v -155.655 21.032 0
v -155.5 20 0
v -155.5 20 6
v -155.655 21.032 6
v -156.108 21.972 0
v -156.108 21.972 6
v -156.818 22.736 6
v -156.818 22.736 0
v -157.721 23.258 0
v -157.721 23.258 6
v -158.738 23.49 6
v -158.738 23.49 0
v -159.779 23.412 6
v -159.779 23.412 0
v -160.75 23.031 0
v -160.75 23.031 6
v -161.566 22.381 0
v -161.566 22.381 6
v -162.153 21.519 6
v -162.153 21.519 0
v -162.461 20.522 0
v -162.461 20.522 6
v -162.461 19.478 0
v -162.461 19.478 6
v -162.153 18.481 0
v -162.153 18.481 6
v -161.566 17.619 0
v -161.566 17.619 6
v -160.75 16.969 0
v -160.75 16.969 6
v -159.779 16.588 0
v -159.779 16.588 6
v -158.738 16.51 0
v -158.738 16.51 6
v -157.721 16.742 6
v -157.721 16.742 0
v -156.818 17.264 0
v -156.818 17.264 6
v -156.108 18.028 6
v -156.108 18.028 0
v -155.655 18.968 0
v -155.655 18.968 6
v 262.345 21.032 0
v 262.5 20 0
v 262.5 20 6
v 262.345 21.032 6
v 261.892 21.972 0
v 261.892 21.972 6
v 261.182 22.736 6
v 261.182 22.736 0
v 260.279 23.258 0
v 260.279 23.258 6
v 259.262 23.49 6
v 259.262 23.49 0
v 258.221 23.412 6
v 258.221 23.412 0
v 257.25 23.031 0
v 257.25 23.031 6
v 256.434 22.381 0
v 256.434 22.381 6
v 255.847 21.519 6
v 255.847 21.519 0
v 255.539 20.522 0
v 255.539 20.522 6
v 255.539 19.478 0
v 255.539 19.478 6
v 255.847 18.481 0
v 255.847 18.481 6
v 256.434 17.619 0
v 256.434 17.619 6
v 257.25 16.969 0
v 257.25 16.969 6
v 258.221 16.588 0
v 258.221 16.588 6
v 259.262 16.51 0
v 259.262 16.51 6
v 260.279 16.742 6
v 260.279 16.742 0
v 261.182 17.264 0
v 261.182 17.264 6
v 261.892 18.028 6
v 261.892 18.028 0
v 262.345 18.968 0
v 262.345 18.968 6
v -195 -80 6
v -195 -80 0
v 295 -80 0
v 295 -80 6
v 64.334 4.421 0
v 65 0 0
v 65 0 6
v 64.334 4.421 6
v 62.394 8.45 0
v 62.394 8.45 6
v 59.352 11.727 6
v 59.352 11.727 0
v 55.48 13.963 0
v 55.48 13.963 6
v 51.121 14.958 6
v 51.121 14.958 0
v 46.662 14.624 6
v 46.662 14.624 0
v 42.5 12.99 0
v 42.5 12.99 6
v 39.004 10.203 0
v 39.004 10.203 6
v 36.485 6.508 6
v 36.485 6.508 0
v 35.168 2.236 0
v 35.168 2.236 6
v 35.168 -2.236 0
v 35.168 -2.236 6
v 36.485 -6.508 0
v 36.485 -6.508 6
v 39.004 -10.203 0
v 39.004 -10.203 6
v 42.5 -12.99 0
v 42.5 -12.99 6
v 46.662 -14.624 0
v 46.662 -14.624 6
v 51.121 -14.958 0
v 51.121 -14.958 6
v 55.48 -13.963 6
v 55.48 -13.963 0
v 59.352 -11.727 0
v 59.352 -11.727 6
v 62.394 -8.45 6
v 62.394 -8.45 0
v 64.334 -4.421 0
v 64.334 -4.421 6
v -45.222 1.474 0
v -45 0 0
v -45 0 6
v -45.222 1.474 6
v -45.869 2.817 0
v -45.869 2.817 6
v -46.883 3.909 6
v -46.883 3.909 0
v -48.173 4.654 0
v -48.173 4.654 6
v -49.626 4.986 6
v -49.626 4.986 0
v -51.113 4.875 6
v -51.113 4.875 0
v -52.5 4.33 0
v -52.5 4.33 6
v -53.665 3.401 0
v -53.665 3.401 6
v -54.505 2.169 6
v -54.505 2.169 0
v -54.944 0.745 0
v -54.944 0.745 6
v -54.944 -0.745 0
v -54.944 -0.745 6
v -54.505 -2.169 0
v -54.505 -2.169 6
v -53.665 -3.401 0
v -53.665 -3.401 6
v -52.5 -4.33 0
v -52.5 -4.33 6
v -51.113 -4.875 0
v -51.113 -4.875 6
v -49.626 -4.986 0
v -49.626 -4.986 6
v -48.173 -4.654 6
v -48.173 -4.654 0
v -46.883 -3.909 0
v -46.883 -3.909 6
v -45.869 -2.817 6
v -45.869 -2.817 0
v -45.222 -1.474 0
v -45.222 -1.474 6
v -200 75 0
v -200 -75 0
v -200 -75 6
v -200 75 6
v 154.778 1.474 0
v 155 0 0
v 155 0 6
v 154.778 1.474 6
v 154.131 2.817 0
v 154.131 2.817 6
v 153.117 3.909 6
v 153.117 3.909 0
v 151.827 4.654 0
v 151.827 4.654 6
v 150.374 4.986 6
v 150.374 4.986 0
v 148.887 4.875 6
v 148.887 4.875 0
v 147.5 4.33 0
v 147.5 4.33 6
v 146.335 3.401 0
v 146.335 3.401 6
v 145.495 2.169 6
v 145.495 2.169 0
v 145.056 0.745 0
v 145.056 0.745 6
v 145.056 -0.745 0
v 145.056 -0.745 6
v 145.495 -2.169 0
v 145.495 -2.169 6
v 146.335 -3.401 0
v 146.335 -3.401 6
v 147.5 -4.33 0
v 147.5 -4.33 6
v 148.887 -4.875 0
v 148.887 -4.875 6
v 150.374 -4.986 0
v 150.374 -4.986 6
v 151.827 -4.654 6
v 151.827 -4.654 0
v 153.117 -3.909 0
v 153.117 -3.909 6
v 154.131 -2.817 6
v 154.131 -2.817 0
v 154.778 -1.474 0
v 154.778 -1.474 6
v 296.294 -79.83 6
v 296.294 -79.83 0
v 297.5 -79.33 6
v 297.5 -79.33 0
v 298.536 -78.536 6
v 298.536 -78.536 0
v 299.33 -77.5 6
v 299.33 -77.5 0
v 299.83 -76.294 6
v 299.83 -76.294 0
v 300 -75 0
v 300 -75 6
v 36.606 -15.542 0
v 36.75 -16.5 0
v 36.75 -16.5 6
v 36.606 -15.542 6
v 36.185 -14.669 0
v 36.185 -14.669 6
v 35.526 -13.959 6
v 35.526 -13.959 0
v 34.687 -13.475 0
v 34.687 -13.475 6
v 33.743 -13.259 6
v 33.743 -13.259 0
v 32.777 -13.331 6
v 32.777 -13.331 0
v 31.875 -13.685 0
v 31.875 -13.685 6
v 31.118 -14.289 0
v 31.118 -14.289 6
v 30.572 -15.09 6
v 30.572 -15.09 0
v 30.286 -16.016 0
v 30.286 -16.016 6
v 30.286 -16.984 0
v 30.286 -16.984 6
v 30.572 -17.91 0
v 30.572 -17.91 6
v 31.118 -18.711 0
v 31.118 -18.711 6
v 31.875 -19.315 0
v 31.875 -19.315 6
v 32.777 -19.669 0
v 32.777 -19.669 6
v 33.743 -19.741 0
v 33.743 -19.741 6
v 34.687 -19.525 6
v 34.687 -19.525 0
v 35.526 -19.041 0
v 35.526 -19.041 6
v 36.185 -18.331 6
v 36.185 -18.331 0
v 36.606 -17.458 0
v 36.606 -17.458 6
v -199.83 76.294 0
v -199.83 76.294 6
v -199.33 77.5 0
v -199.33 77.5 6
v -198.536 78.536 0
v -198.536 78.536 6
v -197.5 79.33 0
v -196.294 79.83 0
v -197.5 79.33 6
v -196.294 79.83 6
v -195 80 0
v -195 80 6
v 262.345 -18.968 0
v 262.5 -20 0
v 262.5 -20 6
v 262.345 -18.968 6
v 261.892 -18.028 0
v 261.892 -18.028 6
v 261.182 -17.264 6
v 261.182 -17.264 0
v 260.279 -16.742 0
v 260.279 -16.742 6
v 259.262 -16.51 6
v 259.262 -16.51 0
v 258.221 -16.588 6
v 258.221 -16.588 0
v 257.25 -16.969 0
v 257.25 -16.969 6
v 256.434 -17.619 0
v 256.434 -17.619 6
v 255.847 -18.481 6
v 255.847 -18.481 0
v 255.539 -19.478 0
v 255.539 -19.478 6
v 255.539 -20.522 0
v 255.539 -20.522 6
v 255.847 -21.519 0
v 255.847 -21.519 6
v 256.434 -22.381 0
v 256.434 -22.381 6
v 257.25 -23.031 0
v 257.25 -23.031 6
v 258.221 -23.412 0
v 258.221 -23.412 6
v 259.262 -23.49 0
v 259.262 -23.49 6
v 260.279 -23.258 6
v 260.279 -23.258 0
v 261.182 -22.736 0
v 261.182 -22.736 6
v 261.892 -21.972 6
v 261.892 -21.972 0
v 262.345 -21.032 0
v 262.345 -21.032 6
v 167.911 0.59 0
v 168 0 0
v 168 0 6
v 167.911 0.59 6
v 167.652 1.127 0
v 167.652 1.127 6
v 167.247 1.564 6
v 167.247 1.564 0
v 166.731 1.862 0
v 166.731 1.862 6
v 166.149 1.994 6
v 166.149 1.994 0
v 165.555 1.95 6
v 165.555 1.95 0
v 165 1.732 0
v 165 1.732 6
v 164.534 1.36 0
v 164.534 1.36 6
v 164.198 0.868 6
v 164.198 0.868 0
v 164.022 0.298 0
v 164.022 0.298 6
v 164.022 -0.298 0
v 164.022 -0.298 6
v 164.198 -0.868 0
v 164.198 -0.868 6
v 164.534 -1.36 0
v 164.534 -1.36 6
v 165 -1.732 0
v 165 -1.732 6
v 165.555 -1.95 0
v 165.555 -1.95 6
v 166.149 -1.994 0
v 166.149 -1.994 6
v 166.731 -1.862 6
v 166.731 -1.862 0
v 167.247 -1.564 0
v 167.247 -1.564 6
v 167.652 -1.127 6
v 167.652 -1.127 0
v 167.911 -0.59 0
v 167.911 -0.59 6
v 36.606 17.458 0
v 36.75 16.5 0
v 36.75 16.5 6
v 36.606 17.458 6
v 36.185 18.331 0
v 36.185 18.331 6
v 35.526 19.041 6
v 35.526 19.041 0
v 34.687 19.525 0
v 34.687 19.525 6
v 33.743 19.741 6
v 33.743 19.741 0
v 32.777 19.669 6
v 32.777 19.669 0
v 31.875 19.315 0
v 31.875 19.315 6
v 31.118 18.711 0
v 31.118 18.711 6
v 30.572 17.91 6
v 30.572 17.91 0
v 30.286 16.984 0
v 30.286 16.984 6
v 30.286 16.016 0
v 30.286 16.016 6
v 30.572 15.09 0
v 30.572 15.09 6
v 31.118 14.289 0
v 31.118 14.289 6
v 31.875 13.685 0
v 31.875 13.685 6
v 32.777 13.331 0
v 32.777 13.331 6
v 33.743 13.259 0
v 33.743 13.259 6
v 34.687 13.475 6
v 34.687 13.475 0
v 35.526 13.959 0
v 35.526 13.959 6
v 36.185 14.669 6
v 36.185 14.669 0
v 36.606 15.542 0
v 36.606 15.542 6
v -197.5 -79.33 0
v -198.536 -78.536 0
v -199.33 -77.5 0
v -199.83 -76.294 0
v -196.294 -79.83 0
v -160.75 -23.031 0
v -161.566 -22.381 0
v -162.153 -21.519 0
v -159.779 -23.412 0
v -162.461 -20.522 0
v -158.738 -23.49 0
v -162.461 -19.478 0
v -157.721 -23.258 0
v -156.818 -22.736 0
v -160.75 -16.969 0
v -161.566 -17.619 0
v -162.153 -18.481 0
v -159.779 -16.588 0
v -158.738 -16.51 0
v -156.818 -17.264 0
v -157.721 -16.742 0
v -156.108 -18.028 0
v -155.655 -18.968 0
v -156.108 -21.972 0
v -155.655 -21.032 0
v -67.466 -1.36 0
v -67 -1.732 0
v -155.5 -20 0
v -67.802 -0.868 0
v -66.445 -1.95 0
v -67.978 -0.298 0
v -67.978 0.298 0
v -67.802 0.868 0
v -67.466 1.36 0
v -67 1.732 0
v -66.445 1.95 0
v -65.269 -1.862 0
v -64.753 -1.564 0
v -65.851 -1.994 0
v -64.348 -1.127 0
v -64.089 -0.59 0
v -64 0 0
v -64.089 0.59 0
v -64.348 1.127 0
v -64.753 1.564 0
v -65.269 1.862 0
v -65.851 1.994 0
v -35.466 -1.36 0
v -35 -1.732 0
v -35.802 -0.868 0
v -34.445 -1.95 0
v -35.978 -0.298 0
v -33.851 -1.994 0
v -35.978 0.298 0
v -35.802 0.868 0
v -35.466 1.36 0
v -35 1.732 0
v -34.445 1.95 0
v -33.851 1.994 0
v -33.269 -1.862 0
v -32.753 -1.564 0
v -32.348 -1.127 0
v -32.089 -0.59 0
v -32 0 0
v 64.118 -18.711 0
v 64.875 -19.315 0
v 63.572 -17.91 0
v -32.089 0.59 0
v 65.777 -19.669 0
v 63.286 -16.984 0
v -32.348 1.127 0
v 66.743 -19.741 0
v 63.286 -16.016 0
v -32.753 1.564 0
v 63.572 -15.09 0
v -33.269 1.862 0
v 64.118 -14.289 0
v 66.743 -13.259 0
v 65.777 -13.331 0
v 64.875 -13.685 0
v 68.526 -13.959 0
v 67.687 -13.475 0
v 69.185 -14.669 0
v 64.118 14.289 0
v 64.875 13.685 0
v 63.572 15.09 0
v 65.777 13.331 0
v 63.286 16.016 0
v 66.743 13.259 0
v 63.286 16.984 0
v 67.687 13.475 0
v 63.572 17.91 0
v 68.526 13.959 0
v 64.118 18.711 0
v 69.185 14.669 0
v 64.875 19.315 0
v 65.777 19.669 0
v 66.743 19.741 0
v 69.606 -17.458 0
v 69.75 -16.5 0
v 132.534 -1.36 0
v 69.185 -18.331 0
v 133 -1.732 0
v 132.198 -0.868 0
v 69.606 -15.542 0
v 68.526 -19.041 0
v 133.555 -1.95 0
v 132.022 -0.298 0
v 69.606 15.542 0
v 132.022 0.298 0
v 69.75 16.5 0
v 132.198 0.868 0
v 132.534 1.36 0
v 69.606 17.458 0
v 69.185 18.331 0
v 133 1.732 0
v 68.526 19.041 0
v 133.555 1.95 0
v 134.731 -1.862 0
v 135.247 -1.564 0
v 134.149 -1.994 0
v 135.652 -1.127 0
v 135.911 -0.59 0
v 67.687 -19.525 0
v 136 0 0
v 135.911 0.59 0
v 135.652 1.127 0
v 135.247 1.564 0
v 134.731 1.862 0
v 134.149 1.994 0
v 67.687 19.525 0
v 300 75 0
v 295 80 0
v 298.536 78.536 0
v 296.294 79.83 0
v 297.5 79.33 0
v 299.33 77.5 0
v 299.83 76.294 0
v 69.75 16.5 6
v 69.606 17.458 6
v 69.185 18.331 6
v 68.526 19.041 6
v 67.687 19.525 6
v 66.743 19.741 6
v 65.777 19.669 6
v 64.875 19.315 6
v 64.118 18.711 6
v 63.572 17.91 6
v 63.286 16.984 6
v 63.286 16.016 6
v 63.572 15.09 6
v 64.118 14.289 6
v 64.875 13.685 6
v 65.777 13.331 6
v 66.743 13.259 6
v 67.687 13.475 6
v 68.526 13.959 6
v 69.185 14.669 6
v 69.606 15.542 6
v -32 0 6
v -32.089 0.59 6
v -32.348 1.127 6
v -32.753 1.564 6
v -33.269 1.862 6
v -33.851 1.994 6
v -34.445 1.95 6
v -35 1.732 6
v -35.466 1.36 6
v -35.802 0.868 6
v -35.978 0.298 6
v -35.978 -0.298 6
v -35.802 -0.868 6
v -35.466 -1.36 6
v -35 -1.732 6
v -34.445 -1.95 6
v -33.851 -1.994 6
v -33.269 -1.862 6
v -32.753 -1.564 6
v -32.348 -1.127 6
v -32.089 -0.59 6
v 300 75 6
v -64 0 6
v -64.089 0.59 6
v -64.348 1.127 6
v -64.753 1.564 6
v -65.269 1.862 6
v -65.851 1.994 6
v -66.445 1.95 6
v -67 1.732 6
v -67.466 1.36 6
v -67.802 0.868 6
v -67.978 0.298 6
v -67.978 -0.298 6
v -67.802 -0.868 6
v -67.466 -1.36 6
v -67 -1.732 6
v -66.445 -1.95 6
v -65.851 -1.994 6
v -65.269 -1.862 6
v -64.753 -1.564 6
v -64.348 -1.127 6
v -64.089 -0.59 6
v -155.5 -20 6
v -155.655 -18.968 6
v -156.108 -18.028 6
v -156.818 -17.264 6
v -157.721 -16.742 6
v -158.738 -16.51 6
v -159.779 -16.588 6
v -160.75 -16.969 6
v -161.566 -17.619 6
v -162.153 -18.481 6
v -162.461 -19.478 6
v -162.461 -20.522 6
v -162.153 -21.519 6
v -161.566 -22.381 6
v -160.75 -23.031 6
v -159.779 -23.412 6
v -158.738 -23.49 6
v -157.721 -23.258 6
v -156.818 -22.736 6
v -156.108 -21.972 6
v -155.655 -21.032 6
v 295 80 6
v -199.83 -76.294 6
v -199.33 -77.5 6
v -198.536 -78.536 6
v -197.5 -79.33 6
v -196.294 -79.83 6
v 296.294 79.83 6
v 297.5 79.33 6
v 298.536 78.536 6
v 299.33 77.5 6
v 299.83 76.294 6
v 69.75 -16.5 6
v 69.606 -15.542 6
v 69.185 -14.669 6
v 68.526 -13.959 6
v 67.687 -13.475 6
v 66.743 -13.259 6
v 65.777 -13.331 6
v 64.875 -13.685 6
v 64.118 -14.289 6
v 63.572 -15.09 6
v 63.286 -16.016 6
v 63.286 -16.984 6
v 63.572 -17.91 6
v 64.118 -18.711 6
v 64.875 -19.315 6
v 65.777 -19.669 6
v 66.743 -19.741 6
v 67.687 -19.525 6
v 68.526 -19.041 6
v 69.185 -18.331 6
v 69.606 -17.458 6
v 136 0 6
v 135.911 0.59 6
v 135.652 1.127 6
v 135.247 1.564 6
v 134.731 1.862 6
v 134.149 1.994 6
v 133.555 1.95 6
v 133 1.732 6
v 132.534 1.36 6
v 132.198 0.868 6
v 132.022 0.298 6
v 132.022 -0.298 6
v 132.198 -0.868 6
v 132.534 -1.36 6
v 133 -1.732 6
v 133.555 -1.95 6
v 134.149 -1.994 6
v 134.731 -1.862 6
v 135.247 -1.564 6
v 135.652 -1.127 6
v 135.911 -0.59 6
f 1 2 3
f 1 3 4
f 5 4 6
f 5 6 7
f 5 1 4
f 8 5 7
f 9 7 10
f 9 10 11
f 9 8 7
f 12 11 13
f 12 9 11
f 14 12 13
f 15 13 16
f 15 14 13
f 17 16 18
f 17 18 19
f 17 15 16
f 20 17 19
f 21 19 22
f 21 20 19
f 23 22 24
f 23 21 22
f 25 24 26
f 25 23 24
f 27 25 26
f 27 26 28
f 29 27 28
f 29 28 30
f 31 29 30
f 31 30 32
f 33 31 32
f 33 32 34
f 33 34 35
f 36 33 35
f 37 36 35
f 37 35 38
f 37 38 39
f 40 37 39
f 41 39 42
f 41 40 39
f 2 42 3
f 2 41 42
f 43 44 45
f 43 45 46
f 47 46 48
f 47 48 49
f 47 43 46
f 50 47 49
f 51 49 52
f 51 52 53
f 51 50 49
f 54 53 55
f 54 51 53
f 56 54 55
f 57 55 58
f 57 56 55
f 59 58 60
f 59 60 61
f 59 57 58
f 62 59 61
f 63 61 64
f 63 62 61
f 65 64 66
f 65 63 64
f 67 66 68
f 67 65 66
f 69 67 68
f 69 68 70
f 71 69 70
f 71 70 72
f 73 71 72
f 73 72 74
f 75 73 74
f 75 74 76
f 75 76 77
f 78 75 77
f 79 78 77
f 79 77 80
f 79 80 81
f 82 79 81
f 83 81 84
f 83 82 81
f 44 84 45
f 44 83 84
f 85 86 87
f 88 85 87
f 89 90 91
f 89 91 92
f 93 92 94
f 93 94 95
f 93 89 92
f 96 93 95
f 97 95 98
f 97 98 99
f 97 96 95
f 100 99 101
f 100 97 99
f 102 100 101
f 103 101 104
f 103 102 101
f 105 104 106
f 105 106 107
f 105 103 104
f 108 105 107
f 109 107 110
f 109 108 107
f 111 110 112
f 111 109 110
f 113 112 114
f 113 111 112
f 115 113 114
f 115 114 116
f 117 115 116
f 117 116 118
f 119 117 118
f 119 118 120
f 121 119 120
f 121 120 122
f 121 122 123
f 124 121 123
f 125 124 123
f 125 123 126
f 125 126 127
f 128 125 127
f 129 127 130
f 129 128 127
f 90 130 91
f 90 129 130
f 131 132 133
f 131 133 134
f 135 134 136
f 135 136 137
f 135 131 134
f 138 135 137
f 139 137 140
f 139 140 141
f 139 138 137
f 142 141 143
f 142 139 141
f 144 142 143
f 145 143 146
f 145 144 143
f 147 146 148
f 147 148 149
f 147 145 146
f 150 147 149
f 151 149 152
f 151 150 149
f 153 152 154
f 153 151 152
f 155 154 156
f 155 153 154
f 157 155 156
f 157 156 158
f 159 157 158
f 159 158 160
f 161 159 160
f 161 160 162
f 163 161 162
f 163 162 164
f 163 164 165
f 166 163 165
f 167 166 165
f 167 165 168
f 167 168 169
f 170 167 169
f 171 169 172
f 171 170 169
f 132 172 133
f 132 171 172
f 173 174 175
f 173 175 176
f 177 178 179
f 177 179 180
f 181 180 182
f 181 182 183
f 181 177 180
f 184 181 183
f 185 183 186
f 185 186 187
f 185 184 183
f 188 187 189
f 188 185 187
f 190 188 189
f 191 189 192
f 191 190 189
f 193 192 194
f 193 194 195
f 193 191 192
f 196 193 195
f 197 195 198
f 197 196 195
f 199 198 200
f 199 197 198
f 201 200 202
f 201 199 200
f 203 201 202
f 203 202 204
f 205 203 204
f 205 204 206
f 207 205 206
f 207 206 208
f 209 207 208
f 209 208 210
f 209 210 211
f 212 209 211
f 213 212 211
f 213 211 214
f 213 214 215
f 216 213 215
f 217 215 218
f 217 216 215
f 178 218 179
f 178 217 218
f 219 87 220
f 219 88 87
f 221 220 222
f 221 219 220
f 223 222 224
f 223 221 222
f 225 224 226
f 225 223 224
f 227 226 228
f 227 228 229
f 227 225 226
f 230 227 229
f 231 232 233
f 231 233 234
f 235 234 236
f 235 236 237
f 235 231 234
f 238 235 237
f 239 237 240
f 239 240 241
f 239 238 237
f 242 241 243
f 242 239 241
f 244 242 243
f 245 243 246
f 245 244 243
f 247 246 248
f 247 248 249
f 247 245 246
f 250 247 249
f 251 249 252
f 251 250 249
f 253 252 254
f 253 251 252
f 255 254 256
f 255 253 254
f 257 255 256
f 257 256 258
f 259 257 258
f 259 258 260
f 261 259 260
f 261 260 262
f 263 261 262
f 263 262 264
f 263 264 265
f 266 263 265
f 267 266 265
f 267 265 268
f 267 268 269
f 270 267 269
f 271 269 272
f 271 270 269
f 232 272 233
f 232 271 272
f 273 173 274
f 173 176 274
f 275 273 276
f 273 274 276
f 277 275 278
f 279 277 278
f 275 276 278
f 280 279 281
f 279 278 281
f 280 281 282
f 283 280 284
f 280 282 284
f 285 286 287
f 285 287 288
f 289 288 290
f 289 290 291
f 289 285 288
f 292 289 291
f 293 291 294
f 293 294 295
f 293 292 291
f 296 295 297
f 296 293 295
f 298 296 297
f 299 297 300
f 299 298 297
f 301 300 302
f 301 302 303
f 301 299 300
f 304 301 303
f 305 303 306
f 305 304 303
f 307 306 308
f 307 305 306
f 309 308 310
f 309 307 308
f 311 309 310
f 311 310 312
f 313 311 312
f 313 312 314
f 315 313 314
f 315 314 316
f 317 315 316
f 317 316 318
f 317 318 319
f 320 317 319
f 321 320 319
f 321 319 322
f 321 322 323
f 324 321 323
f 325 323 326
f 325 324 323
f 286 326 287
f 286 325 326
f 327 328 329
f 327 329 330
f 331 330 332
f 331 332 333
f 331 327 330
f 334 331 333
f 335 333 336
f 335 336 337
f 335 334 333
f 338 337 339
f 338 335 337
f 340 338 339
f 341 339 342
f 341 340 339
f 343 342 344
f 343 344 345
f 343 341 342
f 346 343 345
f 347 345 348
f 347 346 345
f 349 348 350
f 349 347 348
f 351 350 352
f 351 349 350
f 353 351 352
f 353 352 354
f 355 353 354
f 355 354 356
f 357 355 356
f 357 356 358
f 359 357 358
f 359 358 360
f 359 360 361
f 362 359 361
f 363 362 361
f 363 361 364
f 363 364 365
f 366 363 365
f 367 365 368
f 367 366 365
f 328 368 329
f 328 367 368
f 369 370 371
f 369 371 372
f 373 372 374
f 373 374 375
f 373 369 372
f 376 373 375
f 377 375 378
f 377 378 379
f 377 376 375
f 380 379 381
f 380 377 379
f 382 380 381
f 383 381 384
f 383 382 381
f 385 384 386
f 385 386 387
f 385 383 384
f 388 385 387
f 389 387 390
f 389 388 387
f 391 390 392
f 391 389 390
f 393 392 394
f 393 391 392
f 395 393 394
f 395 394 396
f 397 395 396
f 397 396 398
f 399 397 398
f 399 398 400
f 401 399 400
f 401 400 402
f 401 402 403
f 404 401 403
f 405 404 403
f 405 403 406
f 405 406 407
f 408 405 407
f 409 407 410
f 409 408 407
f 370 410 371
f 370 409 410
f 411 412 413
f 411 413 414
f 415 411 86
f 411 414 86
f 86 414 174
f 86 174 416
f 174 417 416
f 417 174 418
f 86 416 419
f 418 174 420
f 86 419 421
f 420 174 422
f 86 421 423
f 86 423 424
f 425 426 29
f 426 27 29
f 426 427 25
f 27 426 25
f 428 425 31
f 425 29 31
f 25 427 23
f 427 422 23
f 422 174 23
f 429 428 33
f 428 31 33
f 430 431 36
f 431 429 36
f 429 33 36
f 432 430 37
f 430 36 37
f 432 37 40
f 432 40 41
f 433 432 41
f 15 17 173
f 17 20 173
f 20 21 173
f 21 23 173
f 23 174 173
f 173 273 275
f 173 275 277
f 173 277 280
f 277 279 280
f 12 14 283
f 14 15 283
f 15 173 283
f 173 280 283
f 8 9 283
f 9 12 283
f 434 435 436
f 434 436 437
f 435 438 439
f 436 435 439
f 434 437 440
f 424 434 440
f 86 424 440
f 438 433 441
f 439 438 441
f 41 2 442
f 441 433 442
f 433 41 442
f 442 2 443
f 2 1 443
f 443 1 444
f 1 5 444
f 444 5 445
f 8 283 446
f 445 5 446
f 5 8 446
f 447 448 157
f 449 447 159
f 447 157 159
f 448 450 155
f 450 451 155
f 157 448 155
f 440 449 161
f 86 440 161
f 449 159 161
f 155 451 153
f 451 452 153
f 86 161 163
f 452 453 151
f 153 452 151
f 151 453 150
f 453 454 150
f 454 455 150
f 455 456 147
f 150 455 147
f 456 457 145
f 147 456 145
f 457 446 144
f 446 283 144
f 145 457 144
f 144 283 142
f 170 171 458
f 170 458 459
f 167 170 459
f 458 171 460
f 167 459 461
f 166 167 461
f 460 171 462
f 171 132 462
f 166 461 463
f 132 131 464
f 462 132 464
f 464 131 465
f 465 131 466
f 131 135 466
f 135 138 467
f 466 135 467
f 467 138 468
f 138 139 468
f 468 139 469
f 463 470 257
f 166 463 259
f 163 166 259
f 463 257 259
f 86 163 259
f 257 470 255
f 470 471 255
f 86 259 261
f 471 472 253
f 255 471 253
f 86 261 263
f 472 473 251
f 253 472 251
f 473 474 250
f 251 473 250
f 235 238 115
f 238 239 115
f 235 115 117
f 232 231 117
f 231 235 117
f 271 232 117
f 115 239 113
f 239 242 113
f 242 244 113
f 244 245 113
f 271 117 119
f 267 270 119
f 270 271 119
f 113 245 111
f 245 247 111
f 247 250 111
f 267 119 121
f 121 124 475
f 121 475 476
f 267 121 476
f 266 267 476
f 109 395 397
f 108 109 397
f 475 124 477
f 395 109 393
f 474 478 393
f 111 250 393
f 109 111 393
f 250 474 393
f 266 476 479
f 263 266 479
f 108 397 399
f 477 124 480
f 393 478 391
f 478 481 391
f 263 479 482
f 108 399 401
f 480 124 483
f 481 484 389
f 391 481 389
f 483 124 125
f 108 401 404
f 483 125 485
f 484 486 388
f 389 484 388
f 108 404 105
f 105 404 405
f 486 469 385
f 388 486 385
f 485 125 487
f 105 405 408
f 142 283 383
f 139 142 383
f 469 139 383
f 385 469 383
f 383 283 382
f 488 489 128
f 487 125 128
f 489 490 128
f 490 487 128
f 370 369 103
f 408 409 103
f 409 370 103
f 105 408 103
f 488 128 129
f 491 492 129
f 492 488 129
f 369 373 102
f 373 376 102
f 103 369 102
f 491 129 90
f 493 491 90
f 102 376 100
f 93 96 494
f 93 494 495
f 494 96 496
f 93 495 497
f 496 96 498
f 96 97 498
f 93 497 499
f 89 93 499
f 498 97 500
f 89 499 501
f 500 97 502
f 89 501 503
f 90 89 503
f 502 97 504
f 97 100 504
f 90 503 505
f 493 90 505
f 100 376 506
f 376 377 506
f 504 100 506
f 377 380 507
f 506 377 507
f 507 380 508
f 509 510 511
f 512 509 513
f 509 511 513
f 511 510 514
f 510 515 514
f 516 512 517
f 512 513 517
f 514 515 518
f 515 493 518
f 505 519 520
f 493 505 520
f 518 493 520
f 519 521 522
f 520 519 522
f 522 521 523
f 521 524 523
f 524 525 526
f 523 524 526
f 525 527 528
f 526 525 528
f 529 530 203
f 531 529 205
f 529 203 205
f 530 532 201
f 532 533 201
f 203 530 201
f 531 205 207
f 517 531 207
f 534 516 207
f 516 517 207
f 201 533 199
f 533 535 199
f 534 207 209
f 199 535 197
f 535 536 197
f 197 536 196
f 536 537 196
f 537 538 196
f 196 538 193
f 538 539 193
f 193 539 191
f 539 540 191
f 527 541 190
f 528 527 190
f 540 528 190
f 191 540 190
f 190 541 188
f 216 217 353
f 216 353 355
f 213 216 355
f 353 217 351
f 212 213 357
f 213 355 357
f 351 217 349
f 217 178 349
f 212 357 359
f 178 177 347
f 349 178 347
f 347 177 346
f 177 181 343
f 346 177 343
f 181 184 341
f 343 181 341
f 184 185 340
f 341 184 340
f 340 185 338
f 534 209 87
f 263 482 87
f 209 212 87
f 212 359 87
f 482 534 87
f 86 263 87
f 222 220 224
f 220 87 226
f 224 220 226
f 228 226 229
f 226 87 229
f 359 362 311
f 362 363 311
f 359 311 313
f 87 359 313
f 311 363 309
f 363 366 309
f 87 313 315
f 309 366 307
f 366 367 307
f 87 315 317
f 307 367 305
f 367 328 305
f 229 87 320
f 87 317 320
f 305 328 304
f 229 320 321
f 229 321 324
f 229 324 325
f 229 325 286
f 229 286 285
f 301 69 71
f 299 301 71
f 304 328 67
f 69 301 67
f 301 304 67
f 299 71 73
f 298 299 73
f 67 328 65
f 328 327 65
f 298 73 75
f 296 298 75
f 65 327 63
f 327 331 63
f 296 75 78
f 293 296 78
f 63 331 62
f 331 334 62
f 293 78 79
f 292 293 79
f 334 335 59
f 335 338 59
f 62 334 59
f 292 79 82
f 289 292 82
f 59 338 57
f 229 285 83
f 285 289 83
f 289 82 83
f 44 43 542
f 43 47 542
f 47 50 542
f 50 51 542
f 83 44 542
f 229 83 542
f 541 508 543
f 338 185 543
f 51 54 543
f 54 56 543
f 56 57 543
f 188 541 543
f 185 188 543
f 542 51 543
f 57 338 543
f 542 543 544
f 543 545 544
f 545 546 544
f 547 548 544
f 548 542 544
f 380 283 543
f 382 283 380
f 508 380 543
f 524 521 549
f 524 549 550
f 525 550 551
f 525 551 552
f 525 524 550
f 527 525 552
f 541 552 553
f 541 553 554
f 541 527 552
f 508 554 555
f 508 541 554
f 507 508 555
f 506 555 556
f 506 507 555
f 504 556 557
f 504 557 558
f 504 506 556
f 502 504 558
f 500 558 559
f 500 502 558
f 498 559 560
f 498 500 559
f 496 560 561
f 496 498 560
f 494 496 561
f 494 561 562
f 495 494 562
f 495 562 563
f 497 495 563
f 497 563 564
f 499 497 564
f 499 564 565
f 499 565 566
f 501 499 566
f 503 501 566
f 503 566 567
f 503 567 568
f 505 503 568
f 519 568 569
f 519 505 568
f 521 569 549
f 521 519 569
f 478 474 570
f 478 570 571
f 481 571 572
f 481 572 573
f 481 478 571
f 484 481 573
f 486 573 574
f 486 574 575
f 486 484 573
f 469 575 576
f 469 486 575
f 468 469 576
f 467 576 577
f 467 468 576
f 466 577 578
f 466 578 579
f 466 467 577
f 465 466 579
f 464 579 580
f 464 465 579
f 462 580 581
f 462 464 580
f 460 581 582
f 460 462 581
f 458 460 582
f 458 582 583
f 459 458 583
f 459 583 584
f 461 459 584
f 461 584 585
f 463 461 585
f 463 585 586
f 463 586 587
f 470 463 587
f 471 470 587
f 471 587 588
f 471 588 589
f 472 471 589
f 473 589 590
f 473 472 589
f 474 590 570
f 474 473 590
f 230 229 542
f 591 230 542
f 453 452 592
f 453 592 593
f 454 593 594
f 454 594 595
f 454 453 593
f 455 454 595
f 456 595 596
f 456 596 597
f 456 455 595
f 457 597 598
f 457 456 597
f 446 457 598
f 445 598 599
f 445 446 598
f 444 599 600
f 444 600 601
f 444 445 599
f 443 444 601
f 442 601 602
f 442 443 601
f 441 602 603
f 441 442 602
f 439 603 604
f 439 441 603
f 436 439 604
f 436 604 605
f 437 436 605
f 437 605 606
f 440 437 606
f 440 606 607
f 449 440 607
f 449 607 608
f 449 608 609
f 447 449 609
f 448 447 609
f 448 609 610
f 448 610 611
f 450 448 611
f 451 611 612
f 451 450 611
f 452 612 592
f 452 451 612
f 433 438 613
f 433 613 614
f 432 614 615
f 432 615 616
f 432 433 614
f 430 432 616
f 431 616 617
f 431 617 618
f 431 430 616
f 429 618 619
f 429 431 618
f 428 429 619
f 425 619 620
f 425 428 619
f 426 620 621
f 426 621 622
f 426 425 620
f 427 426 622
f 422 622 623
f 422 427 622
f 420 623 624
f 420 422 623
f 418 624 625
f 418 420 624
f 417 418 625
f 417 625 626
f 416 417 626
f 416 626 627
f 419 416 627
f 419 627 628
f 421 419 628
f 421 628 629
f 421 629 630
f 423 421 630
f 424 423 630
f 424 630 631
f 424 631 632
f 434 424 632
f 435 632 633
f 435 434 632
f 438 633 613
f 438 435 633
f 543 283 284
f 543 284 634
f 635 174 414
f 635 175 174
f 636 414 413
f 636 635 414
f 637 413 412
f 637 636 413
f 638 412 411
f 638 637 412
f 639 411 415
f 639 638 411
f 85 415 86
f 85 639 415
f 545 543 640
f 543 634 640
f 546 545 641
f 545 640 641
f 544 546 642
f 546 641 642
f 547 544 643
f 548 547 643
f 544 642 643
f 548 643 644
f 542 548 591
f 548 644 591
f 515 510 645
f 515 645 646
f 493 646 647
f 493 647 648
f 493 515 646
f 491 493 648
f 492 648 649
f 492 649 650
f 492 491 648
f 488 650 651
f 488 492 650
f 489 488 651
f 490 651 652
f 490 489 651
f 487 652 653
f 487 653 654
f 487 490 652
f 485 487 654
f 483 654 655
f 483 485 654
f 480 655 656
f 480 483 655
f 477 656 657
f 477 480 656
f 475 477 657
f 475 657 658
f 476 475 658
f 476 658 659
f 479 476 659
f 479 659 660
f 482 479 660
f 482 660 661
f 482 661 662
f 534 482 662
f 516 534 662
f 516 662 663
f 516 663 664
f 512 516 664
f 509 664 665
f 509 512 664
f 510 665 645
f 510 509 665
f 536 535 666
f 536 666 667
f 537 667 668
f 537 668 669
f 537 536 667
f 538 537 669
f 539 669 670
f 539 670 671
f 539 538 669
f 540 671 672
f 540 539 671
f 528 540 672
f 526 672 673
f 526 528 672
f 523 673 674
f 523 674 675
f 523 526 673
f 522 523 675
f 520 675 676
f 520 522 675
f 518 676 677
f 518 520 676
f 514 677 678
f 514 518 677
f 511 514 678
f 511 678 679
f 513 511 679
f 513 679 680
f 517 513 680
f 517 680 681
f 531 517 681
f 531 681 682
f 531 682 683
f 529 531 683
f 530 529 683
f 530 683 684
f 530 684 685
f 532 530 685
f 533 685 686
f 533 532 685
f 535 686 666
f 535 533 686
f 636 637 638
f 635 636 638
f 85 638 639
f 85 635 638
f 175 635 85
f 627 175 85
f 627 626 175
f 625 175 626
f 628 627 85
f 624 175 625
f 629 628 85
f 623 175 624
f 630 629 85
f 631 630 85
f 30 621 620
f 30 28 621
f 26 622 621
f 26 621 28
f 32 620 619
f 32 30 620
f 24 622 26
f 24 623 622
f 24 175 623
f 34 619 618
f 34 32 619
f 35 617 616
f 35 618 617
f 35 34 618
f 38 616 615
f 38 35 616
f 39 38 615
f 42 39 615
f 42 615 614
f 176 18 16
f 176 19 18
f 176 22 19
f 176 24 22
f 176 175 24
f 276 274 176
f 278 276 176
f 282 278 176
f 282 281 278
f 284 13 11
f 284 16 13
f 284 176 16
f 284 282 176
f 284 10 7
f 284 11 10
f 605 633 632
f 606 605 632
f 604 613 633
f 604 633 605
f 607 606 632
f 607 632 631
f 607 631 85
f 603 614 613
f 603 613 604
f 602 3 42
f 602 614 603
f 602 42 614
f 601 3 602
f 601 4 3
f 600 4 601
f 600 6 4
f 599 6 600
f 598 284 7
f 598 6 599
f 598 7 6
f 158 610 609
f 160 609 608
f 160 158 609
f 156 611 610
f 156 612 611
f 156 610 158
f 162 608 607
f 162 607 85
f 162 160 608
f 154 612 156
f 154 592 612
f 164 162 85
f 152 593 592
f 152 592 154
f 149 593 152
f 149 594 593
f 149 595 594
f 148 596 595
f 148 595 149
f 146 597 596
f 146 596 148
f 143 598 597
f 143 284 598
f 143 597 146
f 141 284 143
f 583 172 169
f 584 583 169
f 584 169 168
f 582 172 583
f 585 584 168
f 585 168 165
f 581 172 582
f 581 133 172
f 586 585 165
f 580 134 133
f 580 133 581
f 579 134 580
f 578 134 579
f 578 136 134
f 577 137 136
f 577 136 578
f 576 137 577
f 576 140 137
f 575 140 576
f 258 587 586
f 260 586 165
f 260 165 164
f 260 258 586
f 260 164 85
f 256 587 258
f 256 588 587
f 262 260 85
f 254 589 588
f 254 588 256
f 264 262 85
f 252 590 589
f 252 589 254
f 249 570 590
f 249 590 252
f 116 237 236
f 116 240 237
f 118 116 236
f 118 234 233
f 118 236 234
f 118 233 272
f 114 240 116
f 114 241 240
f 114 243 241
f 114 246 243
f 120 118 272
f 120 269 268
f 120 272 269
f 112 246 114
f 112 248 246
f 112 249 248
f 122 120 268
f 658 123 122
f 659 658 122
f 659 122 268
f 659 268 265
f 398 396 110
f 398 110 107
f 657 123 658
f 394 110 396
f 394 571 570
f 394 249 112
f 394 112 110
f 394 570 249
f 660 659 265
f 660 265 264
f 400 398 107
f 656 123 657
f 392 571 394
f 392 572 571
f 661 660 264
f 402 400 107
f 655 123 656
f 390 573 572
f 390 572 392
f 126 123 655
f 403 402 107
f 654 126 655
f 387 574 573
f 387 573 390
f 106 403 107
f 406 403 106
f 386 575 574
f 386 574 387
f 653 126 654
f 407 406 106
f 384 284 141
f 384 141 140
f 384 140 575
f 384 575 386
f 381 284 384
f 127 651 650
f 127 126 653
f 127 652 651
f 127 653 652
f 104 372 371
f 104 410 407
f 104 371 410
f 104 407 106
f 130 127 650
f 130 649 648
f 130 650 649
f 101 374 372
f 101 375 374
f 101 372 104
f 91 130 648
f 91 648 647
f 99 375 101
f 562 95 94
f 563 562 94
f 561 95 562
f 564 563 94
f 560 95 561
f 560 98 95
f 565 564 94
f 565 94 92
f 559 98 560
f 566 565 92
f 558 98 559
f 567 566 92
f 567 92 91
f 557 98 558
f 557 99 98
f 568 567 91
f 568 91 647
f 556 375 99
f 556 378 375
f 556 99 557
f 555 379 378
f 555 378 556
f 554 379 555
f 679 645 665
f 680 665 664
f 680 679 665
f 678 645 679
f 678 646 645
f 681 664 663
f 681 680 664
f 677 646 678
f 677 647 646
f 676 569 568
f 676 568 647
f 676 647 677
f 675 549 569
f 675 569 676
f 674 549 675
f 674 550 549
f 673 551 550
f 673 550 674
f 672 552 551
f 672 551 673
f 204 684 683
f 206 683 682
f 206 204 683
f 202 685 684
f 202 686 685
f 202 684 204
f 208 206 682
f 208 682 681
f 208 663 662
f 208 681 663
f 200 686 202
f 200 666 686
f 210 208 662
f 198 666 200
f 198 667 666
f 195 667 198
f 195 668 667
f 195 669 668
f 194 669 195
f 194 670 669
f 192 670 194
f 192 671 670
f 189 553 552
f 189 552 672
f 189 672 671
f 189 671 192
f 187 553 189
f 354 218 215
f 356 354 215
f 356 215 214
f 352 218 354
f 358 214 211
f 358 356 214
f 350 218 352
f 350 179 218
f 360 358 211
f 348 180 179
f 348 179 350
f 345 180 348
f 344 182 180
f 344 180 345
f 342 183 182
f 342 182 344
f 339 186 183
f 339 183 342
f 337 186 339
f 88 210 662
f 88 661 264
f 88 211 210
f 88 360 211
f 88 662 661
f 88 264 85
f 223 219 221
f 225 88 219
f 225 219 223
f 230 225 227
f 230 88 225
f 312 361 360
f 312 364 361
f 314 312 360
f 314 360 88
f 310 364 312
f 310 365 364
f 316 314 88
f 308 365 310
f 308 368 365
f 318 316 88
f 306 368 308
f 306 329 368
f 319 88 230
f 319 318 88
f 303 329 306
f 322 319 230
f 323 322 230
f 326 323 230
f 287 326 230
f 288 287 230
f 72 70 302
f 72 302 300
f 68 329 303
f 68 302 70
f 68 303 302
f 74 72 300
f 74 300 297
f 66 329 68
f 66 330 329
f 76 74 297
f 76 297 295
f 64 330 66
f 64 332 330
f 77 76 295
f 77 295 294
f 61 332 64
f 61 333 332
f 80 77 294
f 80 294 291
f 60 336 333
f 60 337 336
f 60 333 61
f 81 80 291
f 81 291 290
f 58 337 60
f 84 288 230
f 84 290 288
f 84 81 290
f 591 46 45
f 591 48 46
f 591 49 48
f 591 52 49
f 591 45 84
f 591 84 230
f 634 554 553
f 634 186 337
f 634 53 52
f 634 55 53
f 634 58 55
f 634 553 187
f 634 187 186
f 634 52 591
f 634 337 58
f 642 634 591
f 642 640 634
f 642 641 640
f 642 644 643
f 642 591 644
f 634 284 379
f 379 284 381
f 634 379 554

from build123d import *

# Parameters (mm, degrees)
SKETCH2_W           = 500
SKETCH2_H           = 160
SKETCH2_R           = 15
SKETCH2_R_2         = 5
SKETCH2_R_3         = 3.5
SKETCH2_R_4         = 2
SKETCH2_R_5         = 3.25
BOSS_EXTRUDE1_DEPTH = 6
FILLET1_R           = 5


with BuildPart() as part:
    # Sketch2 → Boss-Extrude1 (new body)
    with BuildSketch(Plane.XY):
        with Locations((50, 0)):
            Rectangle(SKETCH2_W, SKETCH2_H)
        with Locations((50, 0)):
            Circle(SKETCH2_R, mode=Mode.SUBTRACT)
        with Locations((-50, 0)):
            Circle(SKETCH2_R_2, mode=Mode.SUBTRACT)
        with Locations((150, 0)):
            Circle(SKETCH2_R_2, mode=Mode.SUBTRACT)
        with Locations((-159, 20)):
            Circle(SKETCH2_R_3, mode=Mode.SUBTRACT)
        with Locations((-159, -20)):
            Circle(SKETCH2_R_3, mode=Mode.SUBTRACT)
        with Locations((259, -20)):
            Circle(SKETCH2_R_3, mode=Mode.SUBTRACT)
        with Locations((259, 20)):
            Circle(SKETCH2_R_3, mode=Mode.SUBTRACT)
        with Locations((134, 0)):
            Circle(SKETCH2_R_4, mode=Mode.SUBTRACT)
        with Locations((166, 0)):
            Circle(SKETCH2_R_4, mode=Mode.SUBTRACT)
        with Locations((-66, 0)):
            Circle(SKETCH2_R_4, mode=Mode.SUBTRACT)
        with Locations((-34, 0)):
            Circle(SKETCH2_R_4, mode=Mode.SUBTRACT)
        with Locations((66.5, 16.5)):
            Circle(SKETCH2_R_5, mode=Mode.SUBTRACT)
        with Locations((33.5, 16.5)):
            Circle(SKETCH2_R_5, mode=Mode.SUBTRACT)
        with Locations((33.5, -16.5)):
            Circle(SKETCH2_R_5, mode=Mode.SUBTRACT)
        with Locations((66.5, -16.5)):
            Circle(SKETCH2_R_5, mode=Mode.SUBTRACT)
    extrude(amount=BOSS_EXTRUDE1_DEPTH)

    # Fillet1
    fillet1_edges = [part.edges().sort_by_distance(p)[0] for p in [
        (-200, -80, 3),
        (-200, 80, 3),
        (300, 80, 3),
        (300, -80, 3),
    ]]
    fillet(fillet1_edges, radius=FILLET1_R)


solid = part.part
